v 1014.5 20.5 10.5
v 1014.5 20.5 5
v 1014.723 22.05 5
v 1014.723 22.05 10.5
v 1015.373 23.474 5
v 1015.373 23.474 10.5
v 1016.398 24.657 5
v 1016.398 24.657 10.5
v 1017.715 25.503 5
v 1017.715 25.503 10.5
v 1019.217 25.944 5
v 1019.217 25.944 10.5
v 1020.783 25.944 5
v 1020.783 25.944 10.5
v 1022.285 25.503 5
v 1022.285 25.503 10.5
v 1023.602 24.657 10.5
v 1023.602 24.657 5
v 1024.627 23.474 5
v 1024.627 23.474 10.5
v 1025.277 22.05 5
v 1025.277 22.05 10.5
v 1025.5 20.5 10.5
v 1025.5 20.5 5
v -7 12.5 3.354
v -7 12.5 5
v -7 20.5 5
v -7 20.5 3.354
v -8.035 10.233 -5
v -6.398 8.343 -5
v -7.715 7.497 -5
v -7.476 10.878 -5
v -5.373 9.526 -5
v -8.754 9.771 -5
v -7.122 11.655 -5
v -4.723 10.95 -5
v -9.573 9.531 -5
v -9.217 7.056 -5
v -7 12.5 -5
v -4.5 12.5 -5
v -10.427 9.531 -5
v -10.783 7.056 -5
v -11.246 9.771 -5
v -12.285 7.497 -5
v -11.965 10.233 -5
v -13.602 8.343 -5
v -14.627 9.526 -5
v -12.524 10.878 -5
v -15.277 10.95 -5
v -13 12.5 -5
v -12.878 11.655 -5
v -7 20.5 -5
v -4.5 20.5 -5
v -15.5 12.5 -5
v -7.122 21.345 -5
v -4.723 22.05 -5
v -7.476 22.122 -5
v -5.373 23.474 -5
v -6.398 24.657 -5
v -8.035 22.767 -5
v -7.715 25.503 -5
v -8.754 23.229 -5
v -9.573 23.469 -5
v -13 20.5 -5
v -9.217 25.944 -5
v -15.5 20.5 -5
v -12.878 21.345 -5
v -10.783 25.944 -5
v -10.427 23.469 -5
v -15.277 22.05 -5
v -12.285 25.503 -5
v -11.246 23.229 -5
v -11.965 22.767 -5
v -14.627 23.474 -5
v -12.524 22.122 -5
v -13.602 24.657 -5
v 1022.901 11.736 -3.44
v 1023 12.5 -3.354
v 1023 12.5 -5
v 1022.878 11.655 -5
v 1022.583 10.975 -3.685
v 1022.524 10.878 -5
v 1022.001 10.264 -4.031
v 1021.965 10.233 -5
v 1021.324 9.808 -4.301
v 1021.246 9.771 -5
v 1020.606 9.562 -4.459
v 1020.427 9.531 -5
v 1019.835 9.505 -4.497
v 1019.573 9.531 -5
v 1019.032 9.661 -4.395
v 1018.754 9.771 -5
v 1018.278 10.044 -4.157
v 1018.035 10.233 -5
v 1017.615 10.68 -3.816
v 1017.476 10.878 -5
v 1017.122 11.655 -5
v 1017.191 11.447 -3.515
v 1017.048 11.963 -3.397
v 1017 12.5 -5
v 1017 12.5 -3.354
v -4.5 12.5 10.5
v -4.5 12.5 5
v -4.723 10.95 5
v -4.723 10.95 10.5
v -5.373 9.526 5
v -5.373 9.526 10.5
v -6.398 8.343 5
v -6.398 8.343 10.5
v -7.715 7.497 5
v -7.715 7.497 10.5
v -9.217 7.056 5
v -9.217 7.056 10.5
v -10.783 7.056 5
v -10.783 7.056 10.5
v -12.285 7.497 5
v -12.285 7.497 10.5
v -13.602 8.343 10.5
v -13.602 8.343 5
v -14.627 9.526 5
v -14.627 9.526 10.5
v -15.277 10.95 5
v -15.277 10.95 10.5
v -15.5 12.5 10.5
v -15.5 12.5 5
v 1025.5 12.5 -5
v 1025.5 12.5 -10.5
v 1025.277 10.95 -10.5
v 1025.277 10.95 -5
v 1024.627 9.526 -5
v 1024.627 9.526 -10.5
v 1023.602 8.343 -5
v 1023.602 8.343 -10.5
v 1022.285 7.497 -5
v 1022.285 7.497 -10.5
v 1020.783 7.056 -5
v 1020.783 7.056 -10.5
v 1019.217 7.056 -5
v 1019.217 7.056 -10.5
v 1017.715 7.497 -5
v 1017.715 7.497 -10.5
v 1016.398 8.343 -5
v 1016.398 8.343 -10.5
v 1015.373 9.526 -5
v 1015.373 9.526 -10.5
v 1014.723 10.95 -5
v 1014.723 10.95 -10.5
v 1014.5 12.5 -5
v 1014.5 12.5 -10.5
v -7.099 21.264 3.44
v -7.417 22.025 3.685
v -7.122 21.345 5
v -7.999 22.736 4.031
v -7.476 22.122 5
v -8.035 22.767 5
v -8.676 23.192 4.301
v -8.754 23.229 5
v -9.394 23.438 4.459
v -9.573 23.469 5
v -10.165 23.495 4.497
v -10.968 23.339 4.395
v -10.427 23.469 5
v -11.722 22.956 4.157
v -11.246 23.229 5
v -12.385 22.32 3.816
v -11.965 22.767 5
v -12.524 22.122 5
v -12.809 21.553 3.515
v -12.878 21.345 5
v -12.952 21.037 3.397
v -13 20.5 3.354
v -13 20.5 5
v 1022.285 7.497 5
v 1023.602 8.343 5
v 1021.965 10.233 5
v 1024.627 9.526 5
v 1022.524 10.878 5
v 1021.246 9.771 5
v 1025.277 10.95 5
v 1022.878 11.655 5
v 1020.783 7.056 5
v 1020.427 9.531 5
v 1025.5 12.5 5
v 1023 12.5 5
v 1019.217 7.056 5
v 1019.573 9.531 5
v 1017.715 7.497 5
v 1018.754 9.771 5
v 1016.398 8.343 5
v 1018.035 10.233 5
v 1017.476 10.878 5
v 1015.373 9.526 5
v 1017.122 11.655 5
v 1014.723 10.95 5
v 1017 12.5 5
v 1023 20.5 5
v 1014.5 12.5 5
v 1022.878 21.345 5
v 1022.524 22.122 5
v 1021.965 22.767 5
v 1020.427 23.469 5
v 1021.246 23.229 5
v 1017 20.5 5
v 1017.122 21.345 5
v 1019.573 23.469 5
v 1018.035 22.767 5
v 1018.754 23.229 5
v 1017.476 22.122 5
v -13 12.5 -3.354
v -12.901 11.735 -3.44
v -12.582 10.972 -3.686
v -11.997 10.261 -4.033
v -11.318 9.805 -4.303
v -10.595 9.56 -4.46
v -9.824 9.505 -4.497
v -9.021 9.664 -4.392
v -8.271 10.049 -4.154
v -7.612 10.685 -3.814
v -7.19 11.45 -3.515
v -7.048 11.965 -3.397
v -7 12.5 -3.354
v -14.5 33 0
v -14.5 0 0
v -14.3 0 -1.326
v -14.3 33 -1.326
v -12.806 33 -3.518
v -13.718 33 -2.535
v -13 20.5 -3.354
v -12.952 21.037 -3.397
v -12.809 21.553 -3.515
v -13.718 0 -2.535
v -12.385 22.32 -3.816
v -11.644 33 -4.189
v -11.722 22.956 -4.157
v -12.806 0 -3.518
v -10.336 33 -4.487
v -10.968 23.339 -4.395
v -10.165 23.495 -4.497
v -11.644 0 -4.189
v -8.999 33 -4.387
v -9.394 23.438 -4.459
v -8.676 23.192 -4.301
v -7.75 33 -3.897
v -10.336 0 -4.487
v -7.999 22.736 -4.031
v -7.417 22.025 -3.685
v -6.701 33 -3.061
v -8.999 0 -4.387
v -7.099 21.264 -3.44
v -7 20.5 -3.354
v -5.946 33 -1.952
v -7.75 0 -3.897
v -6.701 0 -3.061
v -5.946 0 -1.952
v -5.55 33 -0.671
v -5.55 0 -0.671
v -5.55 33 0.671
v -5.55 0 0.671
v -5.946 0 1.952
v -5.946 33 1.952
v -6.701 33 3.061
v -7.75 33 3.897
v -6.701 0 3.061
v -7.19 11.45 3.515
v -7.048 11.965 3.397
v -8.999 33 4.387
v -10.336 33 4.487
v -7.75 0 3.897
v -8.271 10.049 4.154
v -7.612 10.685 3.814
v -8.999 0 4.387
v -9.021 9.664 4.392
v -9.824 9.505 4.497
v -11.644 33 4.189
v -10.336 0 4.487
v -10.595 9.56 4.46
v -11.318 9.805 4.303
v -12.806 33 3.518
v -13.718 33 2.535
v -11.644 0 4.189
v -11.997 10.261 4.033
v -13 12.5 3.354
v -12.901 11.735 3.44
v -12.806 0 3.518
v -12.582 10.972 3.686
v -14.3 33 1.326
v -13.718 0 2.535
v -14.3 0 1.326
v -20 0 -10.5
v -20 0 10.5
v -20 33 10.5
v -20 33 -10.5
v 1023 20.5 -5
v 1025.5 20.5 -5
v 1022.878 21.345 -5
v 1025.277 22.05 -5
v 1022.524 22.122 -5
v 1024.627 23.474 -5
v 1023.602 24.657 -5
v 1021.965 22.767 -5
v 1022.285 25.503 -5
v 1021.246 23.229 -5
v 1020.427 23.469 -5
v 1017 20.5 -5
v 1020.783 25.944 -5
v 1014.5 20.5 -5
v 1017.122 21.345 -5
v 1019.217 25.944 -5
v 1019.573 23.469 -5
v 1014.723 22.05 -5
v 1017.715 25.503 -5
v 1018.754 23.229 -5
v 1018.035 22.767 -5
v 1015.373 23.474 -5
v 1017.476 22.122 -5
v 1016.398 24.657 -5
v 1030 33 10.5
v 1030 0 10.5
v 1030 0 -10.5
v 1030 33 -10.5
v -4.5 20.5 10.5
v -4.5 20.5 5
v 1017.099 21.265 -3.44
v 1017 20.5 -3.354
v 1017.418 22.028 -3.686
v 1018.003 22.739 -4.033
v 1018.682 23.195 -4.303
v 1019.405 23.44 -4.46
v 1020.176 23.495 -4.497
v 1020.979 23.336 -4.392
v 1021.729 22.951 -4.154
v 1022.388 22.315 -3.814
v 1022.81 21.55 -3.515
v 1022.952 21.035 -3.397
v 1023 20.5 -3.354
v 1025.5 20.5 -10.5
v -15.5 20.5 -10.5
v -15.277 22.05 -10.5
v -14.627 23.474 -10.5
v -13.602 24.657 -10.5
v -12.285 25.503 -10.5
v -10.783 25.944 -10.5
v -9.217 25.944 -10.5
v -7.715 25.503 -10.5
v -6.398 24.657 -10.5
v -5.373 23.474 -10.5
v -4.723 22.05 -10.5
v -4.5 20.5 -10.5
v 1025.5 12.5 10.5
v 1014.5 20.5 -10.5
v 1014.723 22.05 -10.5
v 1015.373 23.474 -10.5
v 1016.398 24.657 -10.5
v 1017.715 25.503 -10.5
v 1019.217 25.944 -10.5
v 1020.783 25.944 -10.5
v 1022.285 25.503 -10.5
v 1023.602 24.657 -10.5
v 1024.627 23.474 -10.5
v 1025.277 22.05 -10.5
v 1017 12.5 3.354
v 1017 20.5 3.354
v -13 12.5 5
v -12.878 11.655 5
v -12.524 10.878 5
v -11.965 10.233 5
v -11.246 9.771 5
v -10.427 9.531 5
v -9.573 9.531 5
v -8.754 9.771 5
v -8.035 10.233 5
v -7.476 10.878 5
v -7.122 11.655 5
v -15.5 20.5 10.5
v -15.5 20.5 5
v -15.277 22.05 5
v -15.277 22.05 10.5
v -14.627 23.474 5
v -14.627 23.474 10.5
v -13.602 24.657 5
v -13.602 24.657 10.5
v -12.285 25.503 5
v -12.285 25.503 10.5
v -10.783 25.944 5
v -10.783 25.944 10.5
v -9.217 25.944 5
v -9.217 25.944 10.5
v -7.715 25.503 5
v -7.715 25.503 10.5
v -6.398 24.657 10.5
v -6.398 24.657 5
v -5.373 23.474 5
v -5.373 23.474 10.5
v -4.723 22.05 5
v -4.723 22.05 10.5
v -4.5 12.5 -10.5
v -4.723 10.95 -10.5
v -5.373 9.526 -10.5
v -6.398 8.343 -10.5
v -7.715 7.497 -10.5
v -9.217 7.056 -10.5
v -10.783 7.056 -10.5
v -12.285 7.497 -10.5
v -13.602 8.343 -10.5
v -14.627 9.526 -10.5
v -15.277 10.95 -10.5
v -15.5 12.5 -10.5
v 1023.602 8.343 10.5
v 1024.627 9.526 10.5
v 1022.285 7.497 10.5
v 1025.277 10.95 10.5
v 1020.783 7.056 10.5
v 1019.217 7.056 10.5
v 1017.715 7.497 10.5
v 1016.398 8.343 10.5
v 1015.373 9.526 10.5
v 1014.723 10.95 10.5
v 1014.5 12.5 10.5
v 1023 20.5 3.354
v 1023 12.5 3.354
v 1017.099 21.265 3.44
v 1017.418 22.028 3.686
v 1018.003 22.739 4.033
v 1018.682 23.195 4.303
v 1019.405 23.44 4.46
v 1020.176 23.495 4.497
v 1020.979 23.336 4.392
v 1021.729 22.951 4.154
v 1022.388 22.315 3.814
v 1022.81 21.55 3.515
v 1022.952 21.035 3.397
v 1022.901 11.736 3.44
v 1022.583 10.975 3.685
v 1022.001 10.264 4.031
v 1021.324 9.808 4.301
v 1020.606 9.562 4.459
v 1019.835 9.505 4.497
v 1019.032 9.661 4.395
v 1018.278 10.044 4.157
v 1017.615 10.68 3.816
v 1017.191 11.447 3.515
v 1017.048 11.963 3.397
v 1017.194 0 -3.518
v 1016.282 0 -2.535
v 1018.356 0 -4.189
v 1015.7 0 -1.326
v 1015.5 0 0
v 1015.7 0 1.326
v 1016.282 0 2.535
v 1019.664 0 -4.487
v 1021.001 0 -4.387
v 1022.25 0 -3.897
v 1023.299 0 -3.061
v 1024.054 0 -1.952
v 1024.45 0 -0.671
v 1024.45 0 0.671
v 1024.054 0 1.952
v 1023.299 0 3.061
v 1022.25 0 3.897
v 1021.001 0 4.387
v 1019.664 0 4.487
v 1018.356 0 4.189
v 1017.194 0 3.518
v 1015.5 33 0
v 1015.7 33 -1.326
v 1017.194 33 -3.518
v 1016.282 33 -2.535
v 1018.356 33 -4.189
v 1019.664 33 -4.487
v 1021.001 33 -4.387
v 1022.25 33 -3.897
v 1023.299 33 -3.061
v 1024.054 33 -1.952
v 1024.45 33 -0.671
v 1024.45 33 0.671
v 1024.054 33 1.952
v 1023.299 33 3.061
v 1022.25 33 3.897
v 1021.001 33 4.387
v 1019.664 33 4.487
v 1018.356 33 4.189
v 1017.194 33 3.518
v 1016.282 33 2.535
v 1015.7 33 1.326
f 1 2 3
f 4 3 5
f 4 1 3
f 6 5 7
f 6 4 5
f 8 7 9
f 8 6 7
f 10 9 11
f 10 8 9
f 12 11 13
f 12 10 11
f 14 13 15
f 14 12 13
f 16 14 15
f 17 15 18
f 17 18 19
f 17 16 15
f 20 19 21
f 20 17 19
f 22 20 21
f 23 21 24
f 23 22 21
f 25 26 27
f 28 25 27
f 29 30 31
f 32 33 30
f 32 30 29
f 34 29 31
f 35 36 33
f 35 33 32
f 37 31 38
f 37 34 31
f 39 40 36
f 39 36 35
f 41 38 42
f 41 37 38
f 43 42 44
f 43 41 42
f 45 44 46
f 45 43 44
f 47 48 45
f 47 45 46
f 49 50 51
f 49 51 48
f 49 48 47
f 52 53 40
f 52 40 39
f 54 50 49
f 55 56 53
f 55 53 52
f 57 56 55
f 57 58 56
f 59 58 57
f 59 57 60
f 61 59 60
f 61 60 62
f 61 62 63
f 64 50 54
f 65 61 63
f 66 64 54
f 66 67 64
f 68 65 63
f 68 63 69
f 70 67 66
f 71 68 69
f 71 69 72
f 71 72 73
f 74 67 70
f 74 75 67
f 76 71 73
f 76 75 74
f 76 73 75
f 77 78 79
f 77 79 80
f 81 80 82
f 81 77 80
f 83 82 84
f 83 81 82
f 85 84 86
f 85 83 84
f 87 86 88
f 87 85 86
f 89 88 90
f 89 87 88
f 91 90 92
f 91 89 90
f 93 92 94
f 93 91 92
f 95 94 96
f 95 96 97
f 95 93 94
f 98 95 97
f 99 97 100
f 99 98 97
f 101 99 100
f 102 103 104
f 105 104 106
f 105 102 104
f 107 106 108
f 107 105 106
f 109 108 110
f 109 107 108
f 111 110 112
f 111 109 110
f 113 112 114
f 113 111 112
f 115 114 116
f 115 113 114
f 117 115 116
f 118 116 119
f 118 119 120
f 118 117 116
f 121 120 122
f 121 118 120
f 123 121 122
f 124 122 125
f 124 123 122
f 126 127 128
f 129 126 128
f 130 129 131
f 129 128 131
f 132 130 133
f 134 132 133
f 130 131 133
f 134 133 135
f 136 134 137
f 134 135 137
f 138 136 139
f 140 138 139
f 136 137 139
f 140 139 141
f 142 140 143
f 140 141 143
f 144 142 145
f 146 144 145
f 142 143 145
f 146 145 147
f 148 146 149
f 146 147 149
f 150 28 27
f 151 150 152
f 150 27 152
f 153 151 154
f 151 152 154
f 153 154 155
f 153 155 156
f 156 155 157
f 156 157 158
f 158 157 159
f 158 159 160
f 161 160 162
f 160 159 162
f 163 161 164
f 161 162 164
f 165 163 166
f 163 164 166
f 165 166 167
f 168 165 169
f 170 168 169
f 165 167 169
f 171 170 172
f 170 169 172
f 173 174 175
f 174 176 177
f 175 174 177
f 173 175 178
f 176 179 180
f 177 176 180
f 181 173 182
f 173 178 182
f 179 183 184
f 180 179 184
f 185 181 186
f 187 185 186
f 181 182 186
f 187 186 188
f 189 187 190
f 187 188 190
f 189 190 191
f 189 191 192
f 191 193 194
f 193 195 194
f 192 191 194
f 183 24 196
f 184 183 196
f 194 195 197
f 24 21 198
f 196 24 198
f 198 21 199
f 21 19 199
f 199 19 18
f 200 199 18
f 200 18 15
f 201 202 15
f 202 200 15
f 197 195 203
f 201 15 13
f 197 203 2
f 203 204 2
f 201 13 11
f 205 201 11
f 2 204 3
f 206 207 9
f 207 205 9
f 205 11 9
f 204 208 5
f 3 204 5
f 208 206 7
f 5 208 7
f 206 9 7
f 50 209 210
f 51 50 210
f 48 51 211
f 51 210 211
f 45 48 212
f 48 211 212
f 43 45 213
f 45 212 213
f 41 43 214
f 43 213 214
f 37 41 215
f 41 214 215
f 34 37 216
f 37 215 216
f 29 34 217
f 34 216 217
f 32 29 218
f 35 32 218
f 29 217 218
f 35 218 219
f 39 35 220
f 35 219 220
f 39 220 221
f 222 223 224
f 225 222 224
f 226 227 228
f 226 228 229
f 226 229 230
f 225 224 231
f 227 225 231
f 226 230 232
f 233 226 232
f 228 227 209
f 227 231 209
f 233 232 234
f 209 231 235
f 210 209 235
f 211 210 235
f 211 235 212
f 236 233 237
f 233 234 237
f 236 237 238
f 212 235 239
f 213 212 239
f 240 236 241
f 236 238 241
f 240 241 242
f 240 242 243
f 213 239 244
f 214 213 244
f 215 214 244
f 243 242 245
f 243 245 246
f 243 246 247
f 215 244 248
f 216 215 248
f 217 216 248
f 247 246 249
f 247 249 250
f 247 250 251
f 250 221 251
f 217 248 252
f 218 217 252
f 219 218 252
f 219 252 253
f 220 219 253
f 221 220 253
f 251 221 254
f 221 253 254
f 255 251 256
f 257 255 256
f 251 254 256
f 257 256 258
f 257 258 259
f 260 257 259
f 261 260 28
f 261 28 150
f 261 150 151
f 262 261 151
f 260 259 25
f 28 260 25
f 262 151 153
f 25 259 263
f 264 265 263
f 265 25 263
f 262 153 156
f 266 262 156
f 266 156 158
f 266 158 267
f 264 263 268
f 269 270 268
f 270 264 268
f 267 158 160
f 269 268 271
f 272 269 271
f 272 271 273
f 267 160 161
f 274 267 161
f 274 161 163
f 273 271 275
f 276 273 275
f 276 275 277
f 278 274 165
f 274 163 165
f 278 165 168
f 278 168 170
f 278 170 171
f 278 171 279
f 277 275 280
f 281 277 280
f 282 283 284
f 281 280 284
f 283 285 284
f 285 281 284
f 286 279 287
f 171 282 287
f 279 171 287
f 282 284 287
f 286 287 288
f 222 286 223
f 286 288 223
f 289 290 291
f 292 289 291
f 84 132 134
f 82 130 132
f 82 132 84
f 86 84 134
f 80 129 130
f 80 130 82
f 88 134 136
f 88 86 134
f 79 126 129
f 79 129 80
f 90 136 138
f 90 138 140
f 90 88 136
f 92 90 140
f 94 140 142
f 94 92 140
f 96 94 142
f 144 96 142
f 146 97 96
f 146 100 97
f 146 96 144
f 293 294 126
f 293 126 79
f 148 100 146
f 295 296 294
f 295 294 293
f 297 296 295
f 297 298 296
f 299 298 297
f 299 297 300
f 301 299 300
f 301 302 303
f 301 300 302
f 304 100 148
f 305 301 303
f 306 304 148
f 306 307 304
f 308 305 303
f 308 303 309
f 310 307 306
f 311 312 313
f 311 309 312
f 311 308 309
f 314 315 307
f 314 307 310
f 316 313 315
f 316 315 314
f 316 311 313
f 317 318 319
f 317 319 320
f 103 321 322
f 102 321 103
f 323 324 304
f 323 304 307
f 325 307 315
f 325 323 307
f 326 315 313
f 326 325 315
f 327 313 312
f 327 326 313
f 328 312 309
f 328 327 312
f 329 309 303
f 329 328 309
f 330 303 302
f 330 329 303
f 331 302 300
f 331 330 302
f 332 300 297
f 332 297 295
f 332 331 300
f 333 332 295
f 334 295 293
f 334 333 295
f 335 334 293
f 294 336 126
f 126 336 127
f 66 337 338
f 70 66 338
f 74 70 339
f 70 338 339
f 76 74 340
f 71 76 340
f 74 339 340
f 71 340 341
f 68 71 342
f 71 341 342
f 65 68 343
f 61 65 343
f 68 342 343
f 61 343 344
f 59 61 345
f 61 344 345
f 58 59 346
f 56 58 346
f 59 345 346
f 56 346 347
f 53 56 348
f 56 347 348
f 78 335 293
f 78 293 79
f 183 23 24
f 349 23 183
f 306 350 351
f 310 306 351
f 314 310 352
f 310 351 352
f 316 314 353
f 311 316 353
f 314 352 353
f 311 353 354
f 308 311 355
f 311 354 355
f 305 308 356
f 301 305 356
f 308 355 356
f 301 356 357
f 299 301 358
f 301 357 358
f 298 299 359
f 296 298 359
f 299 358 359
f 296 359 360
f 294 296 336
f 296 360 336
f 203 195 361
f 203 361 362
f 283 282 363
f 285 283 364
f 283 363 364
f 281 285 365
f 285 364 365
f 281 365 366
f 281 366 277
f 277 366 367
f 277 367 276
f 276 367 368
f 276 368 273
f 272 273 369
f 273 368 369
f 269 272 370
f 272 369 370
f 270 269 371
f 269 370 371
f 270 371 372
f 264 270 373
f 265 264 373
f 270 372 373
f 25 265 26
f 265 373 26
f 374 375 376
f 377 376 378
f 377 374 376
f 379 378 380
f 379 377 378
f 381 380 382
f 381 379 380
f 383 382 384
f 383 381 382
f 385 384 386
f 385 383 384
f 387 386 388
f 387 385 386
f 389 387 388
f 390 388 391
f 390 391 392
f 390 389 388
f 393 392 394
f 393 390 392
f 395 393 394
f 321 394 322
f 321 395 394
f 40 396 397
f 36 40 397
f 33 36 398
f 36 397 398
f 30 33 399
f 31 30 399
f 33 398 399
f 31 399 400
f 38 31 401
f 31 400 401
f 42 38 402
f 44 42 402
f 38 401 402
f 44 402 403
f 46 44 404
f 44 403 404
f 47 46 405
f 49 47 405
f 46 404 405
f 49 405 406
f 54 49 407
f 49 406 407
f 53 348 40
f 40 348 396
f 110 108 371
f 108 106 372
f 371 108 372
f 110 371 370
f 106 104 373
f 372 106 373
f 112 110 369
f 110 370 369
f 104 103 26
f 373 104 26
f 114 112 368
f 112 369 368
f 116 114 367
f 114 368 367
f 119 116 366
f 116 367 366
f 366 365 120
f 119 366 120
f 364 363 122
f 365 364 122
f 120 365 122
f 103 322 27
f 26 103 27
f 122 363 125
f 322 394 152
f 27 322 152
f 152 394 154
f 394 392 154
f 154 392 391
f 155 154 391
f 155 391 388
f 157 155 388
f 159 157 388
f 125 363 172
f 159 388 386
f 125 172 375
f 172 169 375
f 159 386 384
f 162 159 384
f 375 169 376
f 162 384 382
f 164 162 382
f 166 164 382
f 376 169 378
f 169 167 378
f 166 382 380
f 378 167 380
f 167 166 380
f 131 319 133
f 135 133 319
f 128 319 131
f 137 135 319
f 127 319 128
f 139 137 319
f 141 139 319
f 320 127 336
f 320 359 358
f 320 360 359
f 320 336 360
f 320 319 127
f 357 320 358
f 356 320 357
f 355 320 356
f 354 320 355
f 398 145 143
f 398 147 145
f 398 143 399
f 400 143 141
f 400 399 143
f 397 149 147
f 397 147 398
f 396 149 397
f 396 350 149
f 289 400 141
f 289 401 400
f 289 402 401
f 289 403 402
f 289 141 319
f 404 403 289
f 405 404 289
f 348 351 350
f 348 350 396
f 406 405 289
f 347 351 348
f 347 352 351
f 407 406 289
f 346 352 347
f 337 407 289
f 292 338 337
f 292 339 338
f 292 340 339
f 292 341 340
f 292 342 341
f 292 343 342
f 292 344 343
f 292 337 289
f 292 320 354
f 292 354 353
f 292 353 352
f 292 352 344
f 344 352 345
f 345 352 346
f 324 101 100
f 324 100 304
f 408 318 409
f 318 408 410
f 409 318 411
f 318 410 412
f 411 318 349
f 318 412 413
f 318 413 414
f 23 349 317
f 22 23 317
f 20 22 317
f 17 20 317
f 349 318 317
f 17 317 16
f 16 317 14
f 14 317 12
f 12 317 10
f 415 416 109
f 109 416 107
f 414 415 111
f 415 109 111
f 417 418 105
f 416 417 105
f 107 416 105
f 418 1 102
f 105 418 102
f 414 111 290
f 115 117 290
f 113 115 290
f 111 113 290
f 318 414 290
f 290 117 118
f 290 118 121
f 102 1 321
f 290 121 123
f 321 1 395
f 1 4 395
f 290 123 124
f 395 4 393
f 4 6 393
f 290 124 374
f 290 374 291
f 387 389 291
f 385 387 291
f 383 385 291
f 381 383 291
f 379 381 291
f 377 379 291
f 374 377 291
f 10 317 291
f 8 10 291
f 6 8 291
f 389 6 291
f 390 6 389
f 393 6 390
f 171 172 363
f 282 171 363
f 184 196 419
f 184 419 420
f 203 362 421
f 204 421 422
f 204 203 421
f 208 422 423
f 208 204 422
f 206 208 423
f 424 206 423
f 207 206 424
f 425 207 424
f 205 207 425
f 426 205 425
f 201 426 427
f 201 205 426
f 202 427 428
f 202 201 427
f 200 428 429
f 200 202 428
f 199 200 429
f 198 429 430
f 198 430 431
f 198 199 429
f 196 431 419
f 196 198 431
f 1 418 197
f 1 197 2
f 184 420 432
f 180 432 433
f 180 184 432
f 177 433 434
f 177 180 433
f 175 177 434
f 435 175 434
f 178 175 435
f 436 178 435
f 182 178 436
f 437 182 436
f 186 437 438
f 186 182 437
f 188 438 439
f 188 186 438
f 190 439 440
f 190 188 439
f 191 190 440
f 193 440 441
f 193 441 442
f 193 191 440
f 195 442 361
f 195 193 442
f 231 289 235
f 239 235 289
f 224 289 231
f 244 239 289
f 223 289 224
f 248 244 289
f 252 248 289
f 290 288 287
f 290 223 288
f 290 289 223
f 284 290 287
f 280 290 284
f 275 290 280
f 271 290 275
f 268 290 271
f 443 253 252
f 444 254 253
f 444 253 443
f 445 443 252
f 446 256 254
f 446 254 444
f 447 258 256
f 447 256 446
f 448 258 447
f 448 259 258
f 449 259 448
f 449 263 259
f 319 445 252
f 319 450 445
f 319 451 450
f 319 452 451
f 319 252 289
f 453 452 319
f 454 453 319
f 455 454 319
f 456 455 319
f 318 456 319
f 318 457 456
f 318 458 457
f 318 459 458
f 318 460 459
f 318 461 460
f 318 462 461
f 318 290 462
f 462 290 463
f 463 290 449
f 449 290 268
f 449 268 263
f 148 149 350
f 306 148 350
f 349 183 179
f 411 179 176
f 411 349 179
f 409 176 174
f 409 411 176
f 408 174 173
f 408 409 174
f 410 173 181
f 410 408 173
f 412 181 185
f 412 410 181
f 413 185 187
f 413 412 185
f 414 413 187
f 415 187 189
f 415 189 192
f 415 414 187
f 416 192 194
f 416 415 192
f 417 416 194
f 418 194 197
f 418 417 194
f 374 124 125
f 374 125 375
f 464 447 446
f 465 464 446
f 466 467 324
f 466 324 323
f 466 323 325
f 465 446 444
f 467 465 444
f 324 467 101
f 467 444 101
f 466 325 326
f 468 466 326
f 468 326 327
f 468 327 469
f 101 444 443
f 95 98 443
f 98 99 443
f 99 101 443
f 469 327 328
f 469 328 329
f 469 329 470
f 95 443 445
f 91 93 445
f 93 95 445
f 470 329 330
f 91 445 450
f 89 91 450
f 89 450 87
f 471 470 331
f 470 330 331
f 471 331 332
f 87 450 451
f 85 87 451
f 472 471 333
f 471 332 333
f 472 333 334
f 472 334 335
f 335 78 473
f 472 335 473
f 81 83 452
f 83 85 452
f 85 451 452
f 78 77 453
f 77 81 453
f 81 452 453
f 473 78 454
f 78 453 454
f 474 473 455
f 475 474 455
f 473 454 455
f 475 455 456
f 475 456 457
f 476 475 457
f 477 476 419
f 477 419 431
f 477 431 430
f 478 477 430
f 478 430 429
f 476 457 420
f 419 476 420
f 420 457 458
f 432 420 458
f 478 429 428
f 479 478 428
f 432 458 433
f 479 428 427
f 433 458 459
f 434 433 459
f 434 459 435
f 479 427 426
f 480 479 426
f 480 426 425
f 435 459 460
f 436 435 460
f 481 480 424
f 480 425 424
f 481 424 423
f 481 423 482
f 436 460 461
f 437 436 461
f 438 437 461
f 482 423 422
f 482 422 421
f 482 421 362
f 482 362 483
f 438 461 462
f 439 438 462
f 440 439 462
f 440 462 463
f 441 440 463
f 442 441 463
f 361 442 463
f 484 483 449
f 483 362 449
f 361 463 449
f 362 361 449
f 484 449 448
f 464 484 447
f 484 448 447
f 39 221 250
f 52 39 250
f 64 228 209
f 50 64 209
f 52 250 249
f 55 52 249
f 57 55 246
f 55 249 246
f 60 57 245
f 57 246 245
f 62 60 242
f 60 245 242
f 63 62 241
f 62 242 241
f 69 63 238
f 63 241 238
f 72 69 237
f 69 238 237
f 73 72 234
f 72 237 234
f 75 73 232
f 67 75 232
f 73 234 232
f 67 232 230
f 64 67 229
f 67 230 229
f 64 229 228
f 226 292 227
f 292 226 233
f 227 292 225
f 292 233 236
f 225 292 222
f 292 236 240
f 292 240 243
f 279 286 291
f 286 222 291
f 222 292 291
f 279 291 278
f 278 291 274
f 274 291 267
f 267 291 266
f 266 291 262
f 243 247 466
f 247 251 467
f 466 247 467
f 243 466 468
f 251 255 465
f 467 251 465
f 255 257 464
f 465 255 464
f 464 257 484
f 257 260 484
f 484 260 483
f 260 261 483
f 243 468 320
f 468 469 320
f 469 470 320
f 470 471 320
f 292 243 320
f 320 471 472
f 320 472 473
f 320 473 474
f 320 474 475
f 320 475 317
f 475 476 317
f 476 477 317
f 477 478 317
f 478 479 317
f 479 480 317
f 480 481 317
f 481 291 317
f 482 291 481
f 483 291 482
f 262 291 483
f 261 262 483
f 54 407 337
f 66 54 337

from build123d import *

# Parameters (mm, degrees)
SKETCH1_W                = 1050
SKETCH1_H                = 33
BOSS_EXTRUDE1_DEPTH      = 10.5
CUT_EXTRUDE1_START       = 26
CUT_EXTRUDE1_DEPTH       = 21
F_9_0_9_DIAMETER_HOLE1_D = 9


with BuildPart() as part:
    # Sketch1 → Boss-Extrude1 (new, symmetric)
    with BuildSketch(Plane.XY):
        with Locations((505, 16.5)):
            Rectangle(SKETCH1_W, SKETCH1_H)
        with BuildLine():
            Line((-7, 20.5), (-7, 12.5))
            ThreePointArc((-7, 12.5), (-10, 9.5), (-13, 12.5))
            Line((-13, 12.5), (-13, 20.5))
            ThreePointArc((-13, 20.5), (-10, 23.5), (-7, 20.5))
        make_face(mode=Mode.SUBTRACT)
        with BuildLine():
            ThreePointArc((1017, 20.5), (1020, 23.5), (1023, 20.5))
            Line((1023, 20.5), (1023, 12.5))
            ThreePointArc((1023, 12.5), (1020, 9.5), (1017, 12.5))
            Line((1017, 12.5), (1017, 20.5))
        make_face(mode=Mode.SUBTRACT)
    extrude(amount=BOSS_EXTRUDE1_DEPTH, both=True)

    # Sketch1<3> → Cut-Extrude1 (cut)
    # profile 1 of 2: a face of its own
    with BuildSketch(Plane.XY.offset(CUT_EXTRUDE1_START)):
        with BuildLine():
            Line((-4.5, 12.5), (-4.5, 20.5))
            ThreePointArc((-4.5, 20.5), (-10, 26), (-15.5, 20.5))
            Line((-15.5, 20.5), (-15.5, 12.5))
            ThreePointArc((-15.5, 12.5), (-10, 7), (-4.5, 12.5))
        make_face()
        with BuildLine():
            ThreePointArc((-13, 20.5), (-10, 23.5), (-7, 20.5))
            Line((-7, 20.5), (-7, 12.5))
            ThreePointArc((-7, 12.5), (-10, 9.5), (-13, 12.5))
            Line((-13, 12.5), (-13, 20.5))
        make_face(mode=Mode.SUBTRACT)
    # profile 2 of 2: a face of its own
    with BuildSketch(Plane.XY.offset(CUT_EXTRUDE1_START)):
        with BuildLine():
            Line((1025.5, 12.5), (1025.5, 20.5))
            ThreePointArc((1025.5, 20.5), (1020, 26), (1014.5, 20.5))
            Line((1014.5, 20.5), (1014.5, 12.5))
            ThreePointArc((1014.5, 12.5), (1020, 7), (1025.5, 12.5))
        make_face()
        with BuildLine():
            Line((1017, 12.5), (1017, 20.5))
            ThreePointArc((1017, 20.5), (1020, 23.5), (1023, 20.5))
            Line((1023, 20.5), (1023, 12.5))
            ThreePointArc((1023, 12.5), (1020, 9.5), (1017, 12.5))
        make_face(mode=Mode.SUBTRACT)
    cut_extrude1 = extrude(amount=-CUT_EXTRUDE1_DEPTH, mode=Mode.SUBTRACT)

    # Mirror1: Cut-Extrude1 across plane
    add(cut_extrude1.mirror(Plane.XY), mode=Mode.SUBTRACT)

    # Ø9.0 (9) Diameter Hole1 (through all)
    with Locations(Plane(origin=(0, 33, 0), x_dir=(1, 0, 0), z_dir=(0, 1, 0))):
        with Locations((-10, 0), (1020, 0)):
            Hole(F_9_0_9_DIAMETER_HOLE1_D / 2)


solid = part.part
